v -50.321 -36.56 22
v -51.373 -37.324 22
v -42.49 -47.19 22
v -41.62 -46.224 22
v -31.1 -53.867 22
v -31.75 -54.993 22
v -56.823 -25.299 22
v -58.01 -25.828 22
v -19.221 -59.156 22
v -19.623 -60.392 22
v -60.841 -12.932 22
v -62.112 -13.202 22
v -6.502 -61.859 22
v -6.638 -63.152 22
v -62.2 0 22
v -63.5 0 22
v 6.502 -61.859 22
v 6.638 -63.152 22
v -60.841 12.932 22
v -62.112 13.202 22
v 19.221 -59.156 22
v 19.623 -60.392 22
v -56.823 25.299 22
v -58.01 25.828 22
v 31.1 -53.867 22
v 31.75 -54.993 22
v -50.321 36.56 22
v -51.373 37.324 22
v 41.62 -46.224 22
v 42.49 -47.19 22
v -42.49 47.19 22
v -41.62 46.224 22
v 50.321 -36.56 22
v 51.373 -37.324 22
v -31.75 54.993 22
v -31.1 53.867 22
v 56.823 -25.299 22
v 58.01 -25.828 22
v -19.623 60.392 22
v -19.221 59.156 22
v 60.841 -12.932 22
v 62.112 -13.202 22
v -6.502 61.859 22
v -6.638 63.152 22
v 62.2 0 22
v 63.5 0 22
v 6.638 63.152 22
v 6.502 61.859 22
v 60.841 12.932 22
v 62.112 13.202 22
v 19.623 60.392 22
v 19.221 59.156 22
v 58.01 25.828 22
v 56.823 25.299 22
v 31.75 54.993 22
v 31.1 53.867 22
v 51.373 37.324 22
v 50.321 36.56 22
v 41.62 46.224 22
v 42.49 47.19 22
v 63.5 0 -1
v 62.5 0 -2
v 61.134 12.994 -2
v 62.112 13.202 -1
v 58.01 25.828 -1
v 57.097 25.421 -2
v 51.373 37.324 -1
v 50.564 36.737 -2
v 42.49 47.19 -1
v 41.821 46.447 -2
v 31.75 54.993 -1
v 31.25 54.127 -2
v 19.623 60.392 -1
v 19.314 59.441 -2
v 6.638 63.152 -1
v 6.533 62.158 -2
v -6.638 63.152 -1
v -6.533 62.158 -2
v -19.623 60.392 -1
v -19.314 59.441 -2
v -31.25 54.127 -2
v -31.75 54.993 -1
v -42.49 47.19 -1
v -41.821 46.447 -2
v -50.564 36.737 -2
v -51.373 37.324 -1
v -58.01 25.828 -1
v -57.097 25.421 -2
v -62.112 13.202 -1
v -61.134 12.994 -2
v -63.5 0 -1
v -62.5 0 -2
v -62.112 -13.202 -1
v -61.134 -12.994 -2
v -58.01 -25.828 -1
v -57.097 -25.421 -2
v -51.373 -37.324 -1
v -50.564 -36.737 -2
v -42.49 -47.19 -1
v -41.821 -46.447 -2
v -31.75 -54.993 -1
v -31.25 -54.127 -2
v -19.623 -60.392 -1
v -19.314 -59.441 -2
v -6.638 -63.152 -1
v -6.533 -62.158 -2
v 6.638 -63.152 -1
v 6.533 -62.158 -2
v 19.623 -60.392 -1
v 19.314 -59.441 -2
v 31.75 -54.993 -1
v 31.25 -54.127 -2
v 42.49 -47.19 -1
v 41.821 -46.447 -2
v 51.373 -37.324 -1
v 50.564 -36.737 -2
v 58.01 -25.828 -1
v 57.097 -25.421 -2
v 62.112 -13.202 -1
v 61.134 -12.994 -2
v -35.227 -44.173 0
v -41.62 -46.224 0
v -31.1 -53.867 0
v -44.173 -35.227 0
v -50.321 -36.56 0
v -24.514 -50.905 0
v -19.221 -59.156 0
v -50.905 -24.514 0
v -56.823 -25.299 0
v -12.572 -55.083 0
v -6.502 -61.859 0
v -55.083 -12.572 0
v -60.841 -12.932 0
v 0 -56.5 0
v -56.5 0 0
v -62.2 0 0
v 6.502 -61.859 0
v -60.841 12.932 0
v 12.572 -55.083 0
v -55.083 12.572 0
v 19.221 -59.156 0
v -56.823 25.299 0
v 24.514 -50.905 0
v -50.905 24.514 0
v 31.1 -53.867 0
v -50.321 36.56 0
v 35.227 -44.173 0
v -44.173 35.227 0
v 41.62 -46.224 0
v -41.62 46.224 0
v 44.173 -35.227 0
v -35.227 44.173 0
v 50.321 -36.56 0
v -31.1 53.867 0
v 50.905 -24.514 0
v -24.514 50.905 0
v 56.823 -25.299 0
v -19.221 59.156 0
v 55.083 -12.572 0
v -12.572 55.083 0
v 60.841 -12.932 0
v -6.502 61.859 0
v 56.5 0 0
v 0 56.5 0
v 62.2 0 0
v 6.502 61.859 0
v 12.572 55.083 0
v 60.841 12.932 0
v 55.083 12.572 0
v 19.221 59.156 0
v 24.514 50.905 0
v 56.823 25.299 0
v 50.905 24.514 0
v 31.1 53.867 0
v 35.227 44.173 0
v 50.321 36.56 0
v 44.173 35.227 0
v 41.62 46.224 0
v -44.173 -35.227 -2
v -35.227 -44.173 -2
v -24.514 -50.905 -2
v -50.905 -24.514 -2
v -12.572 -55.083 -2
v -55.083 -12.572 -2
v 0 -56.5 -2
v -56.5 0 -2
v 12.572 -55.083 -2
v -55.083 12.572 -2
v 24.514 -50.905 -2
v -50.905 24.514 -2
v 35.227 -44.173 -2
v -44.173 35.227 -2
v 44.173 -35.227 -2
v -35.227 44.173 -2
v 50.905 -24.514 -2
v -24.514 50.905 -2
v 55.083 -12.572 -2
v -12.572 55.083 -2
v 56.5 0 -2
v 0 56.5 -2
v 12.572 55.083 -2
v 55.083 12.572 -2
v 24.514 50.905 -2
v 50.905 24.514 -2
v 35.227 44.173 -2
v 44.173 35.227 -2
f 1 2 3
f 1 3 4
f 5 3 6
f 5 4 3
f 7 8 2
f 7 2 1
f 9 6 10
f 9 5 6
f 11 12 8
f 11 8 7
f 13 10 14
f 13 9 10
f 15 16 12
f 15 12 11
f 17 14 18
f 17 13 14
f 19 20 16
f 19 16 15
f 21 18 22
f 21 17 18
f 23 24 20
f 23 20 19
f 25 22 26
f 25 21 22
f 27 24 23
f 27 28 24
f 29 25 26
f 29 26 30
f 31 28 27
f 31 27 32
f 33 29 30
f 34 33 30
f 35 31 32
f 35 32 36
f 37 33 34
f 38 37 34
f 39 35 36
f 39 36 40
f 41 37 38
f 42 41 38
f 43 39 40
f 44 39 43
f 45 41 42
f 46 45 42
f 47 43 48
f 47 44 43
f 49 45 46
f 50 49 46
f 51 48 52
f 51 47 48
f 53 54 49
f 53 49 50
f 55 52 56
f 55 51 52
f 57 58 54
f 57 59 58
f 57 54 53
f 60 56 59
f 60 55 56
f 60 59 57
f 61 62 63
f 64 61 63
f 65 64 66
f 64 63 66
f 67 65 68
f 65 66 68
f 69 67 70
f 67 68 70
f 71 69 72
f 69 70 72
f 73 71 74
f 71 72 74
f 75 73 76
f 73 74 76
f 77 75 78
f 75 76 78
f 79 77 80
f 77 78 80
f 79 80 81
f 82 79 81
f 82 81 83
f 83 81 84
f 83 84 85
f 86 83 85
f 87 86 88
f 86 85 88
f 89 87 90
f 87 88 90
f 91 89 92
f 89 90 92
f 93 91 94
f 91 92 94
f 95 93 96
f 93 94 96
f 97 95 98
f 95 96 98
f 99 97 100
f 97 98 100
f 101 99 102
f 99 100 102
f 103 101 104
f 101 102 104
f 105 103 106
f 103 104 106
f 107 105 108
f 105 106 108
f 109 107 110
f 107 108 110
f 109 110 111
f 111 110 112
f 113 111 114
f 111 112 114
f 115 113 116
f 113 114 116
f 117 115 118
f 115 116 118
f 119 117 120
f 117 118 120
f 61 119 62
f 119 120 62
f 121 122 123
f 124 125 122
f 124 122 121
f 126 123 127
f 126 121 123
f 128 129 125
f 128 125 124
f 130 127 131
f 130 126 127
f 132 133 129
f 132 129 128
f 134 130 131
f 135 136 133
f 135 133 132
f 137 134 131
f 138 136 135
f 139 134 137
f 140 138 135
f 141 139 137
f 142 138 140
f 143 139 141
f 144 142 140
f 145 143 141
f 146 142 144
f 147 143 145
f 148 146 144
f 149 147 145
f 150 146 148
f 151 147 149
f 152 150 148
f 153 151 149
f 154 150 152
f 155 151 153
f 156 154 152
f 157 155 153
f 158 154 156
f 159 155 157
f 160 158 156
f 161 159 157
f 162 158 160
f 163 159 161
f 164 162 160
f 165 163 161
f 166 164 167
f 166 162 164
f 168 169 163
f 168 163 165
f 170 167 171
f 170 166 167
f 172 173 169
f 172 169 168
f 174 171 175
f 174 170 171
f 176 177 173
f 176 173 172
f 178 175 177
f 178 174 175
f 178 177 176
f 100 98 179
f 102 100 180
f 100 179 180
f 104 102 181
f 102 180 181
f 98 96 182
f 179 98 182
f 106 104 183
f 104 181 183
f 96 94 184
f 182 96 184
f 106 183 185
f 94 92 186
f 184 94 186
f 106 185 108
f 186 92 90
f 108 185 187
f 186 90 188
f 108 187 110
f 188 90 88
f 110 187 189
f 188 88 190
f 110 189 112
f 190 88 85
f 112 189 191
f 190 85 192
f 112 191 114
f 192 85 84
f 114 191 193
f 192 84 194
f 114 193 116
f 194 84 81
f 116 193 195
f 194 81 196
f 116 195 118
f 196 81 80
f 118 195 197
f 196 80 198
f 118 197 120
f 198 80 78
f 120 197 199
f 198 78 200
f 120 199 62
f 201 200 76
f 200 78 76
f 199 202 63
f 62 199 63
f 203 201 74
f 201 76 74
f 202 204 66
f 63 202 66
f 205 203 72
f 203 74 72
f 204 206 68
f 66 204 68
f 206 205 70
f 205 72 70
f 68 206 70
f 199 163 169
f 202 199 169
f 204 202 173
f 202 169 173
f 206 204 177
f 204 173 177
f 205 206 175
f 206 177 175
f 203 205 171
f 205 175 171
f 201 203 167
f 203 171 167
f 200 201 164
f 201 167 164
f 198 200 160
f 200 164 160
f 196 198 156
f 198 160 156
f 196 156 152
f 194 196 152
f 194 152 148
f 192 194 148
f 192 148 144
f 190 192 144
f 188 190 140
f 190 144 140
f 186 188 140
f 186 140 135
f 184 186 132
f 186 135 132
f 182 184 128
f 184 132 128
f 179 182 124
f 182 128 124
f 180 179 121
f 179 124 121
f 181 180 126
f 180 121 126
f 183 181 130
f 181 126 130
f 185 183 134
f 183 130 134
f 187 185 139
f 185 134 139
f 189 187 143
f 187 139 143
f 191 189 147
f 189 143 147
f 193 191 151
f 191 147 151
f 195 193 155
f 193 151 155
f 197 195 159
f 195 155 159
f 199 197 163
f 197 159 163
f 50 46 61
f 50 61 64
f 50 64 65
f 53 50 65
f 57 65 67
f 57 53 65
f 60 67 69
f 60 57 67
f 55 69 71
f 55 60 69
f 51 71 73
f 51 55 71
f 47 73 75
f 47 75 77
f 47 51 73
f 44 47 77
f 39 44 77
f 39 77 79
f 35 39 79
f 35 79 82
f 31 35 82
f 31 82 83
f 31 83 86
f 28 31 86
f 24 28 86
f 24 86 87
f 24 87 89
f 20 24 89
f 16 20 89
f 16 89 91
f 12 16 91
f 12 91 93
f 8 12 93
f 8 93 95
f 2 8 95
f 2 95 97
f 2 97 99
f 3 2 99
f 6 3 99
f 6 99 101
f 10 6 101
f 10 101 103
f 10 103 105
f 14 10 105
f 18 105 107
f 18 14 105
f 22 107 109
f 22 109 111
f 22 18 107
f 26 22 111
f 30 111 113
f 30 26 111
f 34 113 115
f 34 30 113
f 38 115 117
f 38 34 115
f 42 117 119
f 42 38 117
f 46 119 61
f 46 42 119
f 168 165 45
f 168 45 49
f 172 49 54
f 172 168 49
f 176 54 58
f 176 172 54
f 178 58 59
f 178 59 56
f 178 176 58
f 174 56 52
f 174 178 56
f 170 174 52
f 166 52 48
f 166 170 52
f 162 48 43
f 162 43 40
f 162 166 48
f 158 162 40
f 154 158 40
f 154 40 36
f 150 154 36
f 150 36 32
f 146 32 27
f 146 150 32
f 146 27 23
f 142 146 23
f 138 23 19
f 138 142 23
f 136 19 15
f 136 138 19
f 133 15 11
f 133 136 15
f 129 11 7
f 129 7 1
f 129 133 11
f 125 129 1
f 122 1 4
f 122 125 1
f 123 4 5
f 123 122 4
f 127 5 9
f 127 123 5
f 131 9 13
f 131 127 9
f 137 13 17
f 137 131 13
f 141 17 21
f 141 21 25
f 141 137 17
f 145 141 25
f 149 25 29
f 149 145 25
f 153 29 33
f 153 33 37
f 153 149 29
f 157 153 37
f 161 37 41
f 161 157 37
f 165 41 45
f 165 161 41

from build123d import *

# Parameters (mm, degrees)
F0_R     = 63.5
F0_R_2   = 62.2
F1_DEPTH = 22
F2_R     = 63.5
F2_R_2   = 56.5
F3_DEPTH = 2
F4_SIZE  = 1


with BuildPart() as f1:
    # F0 (on Top) → F1 (new body)
    with BuildSketch(Plane.XY):
        Circle(F0_R)
        Circle(F0_R_2, mode=Mode.SUBTRACT)
    extrude(amount=F1_DEPTH)

    # F2 (on Top) → F3 (join)
    with BuildSketch(Plane.XY):
        Circle(F2_R)
        Circle(F2_R_2, mode=Mode.SUBTRACT)
    extrude(amount=-F3_DEPTH)

    # F4
    f4_edges = [f1.edges().sort_by_distance(p)[0] for p in [
        (-63.5, 0, -2),
    ]]
    chamfer(f4_edges, length=F4_SIZE)


solid = f1.part
